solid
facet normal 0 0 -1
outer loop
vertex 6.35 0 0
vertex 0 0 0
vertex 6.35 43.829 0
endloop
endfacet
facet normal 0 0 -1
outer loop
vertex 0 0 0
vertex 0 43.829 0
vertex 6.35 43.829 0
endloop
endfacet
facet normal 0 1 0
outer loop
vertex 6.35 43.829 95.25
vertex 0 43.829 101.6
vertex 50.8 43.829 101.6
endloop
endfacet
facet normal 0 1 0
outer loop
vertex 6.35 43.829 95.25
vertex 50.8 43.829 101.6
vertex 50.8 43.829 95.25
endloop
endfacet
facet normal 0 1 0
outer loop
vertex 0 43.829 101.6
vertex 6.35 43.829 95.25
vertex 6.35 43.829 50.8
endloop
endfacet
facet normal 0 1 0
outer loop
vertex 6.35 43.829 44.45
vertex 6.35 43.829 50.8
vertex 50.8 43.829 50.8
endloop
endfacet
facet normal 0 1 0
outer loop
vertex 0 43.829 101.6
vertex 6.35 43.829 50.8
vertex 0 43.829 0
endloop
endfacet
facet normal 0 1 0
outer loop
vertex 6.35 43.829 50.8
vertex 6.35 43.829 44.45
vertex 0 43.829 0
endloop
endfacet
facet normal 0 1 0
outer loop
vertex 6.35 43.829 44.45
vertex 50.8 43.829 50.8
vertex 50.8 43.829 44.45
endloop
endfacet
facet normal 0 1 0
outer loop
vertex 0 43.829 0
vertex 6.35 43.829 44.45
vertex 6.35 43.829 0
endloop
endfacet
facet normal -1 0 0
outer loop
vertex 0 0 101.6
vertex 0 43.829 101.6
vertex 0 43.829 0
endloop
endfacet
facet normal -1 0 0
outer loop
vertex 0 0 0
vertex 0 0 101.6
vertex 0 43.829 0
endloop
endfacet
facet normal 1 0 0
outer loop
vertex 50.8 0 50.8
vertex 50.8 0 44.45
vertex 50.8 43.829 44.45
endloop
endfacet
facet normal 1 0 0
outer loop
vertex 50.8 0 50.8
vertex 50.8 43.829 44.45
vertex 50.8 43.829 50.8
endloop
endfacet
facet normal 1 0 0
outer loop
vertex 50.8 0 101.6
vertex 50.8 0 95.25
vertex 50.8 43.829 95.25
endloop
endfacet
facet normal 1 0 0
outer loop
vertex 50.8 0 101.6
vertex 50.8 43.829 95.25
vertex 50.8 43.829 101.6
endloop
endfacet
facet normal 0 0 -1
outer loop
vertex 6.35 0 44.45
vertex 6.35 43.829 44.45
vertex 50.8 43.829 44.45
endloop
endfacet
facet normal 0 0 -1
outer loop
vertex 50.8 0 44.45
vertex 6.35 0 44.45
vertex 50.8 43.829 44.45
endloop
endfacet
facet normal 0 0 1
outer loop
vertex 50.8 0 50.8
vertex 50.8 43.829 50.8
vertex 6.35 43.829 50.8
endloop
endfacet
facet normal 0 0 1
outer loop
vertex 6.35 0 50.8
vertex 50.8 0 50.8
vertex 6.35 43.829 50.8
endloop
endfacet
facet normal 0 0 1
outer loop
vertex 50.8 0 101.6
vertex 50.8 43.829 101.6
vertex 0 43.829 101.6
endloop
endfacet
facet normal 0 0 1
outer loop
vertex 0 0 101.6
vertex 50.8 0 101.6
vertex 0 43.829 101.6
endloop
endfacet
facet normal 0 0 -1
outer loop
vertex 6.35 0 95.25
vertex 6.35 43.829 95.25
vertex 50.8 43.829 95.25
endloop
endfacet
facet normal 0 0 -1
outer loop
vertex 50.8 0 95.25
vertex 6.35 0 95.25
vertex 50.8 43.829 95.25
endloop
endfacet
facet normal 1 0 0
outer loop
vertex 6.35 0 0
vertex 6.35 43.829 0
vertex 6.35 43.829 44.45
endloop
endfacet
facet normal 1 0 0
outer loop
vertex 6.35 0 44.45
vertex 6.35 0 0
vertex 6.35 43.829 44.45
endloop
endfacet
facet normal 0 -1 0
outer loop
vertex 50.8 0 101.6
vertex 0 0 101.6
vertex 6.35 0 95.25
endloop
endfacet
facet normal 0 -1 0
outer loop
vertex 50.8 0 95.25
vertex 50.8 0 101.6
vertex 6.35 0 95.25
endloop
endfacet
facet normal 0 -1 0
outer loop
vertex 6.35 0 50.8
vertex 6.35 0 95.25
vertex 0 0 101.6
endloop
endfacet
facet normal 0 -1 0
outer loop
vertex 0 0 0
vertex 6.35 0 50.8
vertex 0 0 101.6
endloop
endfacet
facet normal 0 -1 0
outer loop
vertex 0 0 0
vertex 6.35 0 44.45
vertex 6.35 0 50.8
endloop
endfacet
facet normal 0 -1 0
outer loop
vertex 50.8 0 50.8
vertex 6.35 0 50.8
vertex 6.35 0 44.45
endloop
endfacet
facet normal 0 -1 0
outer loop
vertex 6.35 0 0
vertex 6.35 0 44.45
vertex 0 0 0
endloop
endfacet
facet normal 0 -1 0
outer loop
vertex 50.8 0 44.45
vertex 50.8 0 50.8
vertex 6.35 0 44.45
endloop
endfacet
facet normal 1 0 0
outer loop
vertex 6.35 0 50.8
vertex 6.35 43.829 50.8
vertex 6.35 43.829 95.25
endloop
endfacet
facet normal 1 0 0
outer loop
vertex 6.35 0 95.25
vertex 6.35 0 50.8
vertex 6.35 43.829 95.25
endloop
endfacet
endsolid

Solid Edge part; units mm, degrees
sketch "Sketch1" plane through (0, 0, 0) normal (1, 0, 0) x (0, 1, 0)
  line L0 (0, 0) -> (43.8289, 0)
sketch "Sketch2" plane through (0, 0, 0) normal (0, -1, 0) x (1, 0, 0)
  line L0 (0, 101.6) -> (0, 0)
  line L1 (0, 0) -> (6.35, 0)
  line L2 (6.35, 44.45) -> (6.35, 0)
  line L3 (50.8, 44.45) -> (6.35, 44.45)
  line L4 (50.8, 50.8) -> (50.8, 44.45)
  line L5 (6.35, 50.8) -> (50.8, 50.8)
  line L6 (6.35, 95.25) -> (6.35, 50.8)
  line L7 (6.35, 95.25) -> (50.8, 95.25)
  line L8 (50.8, 95.25) -> (50.8, 101.6)
  line L9 (50.8, 101.6) -> (0, 101.6)
  dimension "D1" = 101.6
  dimension "D2" = 6.35
  dimension "D3" = 50.8
  dimension "D4" = 44.45
sweep "SweptProtrusion_1" add profiles "Sketch2" path "Sketch1"
